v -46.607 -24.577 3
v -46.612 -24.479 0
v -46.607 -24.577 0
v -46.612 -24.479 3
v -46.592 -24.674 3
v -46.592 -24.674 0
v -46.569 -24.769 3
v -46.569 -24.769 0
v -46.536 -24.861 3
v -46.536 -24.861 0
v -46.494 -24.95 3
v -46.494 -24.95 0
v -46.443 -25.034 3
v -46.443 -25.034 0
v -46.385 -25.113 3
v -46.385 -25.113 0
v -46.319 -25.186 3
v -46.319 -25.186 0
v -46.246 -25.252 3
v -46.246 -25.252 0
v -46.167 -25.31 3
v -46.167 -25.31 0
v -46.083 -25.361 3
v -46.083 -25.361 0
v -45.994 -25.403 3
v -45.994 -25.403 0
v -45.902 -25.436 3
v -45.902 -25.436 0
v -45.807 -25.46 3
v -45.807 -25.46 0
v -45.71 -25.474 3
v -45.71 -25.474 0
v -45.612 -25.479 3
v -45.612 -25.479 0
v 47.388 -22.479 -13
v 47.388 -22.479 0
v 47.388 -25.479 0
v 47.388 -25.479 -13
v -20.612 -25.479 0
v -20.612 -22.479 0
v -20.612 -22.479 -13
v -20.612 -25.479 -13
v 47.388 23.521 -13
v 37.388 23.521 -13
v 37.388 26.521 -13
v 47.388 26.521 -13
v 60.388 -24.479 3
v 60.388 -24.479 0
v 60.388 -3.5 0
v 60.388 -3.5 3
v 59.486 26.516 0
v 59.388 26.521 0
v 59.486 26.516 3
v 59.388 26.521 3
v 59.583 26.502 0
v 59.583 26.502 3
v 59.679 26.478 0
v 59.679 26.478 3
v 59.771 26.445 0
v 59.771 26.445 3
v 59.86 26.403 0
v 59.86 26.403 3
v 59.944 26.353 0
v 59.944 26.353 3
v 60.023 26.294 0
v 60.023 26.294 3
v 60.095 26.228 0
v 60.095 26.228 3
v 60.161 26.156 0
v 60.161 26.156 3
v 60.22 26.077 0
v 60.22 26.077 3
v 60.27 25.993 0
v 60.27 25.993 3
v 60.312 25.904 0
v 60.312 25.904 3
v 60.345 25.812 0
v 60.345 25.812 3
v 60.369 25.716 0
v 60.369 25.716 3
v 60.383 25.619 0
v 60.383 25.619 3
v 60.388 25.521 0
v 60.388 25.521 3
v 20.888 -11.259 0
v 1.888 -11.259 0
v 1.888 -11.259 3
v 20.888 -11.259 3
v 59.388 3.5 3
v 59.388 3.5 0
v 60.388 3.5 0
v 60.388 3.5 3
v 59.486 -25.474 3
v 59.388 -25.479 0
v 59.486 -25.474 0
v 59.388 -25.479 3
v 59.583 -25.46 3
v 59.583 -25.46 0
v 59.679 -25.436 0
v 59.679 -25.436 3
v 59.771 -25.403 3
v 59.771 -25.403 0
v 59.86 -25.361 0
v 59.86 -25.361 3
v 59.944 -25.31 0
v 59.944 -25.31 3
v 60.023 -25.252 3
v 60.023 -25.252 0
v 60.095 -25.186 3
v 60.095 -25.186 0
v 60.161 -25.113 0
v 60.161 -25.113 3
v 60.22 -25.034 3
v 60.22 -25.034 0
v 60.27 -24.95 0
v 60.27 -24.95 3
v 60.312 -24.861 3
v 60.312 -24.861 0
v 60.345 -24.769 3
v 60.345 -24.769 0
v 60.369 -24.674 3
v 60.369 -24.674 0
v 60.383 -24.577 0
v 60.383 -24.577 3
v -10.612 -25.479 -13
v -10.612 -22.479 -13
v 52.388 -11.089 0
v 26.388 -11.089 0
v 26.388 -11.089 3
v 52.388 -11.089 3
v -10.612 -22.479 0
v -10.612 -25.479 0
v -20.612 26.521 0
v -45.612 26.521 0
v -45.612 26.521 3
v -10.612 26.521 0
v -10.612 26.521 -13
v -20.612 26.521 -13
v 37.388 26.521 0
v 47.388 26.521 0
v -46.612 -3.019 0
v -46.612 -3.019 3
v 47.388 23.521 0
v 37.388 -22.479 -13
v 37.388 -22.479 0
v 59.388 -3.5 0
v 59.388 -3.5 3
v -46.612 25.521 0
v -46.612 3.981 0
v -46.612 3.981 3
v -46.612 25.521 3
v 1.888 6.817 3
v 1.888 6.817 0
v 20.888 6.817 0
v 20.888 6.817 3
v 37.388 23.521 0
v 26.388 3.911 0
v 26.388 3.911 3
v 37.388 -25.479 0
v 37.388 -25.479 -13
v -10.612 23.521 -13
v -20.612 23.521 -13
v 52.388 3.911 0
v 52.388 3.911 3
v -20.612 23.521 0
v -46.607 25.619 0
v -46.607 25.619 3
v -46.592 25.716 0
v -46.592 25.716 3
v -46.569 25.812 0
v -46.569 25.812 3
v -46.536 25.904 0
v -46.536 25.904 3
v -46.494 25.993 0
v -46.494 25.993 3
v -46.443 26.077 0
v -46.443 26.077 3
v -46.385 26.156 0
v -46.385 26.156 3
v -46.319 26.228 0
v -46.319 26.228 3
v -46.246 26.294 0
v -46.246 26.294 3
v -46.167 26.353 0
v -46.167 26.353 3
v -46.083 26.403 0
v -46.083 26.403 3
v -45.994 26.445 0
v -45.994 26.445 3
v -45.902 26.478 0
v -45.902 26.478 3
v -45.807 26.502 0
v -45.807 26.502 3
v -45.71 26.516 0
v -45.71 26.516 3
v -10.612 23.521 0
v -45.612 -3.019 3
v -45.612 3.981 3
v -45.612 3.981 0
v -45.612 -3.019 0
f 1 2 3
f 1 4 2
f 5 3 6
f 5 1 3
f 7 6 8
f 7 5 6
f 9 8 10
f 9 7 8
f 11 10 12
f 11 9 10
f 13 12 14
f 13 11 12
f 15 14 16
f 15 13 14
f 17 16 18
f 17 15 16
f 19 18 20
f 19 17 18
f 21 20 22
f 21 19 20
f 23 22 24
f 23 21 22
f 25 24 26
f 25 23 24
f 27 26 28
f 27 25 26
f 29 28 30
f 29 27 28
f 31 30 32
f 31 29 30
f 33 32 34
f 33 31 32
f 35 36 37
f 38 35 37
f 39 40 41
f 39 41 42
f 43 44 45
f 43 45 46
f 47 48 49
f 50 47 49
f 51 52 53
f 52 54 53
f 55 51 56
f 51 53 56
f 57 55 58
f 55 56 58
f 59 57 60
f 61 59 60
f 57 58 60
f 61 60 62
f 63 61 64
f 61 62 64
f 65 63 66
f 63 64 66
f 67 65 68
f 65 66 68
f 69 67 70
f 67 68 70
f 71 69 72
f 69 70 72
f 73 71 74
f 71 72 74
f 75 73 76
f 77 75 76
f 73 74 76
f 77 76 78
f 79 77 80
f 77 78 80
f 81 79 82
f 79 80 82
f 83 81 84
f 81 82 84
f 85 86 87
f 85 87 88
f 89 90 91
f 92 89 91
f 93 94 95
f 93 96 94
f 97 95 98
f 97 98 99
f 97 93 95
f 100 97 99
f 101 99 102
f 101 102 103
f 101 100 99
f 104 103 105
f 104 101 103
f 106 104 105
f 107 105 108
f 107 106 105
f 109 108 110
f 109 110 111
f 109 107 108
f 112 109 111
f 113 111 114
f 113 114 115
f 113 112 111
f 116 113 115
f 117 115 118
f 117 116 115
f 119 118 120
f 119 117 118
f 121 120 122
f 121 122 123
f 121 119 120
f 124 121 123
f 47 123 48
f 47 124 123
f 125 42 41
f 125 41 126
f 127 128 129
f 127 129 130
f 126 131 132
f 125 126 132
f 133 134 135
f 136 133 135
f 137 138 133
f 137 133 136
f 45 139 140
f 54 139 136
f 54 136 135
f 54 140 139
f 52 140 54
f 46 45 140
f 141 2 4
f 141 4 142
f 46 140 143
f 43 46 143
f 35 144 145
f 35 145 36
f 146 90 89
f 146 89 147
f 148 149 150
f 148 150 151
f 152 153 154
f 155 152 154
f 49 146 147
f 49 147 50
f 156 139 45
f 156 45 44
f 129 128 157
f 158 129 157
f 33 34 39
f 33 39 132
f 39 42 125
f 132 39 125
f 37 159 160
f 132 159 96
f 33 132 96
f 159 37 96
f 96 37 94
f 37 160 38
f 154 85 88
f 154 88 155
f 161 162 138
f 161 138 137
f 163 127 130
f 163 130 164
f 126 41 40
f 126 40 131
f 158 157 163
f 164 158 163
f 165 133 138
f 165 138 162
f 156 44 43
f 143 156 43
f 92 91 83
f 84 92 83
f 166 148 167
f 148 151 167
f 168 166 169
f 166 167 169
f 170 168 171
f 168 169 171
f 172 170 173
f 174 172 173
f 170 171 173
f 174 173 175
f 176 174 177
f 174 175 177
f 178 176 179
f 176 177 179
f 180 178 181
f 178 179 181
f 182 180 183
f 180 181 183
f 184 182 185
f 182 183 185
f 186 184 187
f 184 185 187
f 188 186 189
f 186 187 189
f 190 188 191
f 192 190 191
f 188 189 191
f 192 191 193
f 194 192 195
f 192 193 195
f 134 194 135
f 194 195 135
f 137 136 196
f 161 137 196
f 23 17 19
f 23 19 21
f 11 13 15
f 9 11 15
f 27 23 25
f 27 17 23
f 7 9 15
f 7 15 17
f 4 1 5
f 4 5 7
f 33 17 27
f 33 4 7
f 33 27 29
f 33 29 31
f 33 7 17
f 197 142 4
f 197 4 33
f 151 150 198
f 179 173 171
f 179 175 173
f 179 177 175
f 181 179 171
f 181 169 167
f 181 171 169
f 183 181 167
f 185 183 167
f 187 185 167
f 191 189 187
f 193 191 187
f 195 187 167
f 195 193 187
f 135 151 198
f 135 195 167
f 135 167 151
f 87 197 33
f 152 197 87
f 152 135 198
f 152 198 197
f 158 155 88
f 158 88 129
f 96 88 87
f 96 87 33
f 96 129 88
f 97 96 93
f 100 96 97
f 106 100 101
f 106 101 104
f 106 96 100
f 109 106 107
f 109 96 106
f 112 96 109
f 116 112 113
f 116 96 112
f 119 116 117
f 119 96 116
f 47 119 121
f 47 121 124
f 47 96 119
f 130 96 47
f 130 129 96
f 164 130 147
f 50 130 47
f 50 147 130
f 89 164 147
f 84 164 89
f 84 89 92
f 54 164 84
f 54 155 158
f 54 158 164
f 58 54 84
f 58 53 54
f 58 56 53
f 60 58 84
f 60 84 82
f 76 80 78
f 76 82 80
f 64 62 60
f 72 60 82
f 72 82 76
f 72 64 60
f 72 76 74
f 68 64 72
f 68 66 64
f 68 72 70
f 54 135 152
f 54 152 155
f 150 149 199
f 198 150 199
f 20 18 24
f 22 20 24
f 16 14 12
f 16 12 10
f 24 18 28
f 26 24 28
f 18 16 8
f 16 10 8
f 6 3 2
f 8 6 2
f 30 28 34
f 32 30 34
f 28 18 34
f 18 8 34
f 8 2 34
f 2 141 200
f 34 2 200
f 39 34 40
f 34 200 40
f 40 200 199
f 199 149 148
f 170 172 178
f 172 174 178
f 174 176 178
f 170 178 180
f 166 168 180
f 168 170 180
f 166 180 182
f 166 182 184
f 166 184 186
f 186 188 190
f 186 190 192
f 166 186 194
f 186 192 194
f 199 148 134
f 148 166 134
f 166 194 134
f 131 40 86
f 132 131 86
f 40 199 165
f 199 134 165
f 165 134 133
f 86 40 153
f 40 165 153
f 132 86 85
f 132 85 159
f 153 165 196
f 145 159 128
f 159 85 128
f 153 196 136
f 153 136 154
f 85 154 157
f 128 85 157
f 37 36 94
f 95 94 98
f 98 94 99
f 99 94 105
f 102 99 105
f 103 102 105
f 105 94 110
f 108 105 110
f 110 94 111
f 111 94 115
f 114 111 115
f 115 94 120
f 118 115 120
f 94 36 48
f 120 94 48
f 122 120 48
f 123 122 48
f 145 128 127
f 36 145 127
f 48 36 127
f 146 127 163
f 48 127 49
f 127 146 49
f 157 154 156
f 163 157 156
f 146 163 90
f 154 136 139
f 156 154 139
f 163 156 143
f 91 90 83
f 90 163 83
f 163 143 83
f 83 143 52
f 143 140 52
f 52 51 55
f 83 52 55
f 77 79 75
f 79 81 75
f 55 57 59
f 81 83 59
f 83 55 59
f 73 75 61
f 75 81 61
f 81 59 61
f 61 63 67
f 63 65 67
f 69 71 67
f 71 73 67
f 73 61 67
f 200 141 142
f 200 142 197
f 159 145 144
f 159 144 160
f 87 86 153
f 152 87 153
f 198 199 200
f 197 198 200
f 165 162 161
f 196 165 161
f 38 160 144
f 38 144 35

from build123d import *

# Parameters (mm, degrees)
SKETCH_W     = 107
SKETCH_H     = 52
SKETCH_W_2   = 19
SKETCH_H_2   = 18.075611
SKETCH_W_3   = 26
SKETCH_H_3   = 15
PAD_DEPTH    = 3
FILLET_R     = 1
SKETCH001_W  = 1
SKETCH001_H  = 7
POCKET_DEPTH = 3.001
SKETCH002_W  = 10
SKETCH002_H  = 3
PAD001_DEPTH = 13


with BuildPart() as part:
    # Sketch → Pad (new body)
    with BuildSketch(Plane.XY):
        with Locations((6.888296, 0.52123)):
            Rectangle(SKETCH_W, SKETCH_H)
        with Locations((11.388296, -2.220965)):
            Rectangle(SKETCH_W_2, SKETCH_H_2, mode=Mode.SUBTRACT)
        with Locations((39.388296, -3.58877)):
            Rectangle(SKETCH_W_3, SKETCH_H_3, mode=Mode.SUBTRACT)
    extrude(amount=PAD_DEPTH)

    # Fillet
    fillet_edges = [part.edges().sort_by_distance(p)[0] for p in [
        (-46.611704, 26.52123, 1.5),
        (60.388296, 26.52123, 1.5),
        (60.388296, -25.47877, 1.5),
        (-46.611704, -25.47877, 1.5),
    ]]
    fillet(fillet_edges, radius=FILLET_R)

    # Sketch001 (on ShapeBinder) → Pocket (cut, through all)
    with BuildSketch(Plane(origin=(0, 0, 0), x_dir=(1, 0, 0), z_dir=(0, 0, -1))):
        with Locations((-46.111704, -0.481376)):
            Rectangle(SKETCH001_W, SKETCH001_H)
        with Locations((59.888296, 0)):
            Rectangle(SKETCH001_W, SKETCH001_H)
    extrude(amount=-POCKET_DEPTH, mode=Mode.SUBTRACT)

    # Sketch002 (on ShapeBinder) → Pad001 (join)
    with BuildSketch(Plane(origin=(0, 0, 0), x_dir=(1, 0, 0), z_dir=(0, 0, -1))):
        with Locations((-15.611704, 23.97877)):
            Rectangle(SKETCH002_W, SKETCH002_H)
        with Locations((42.388296, 23.97877)):
            Rectangle(SKETCH002_W, SKETCH002_H)
        with Locations((-15.611704, -25.02123)):
            Rectangle(SKETCH002_W, SKETCH002_H)
        with Locations((42.388296, -25.02123)):
            Rectangle(SKETCH002_W, SKETCH002_H)
    extrude(amount=PAD001_DEPTH)


solid = part.part
